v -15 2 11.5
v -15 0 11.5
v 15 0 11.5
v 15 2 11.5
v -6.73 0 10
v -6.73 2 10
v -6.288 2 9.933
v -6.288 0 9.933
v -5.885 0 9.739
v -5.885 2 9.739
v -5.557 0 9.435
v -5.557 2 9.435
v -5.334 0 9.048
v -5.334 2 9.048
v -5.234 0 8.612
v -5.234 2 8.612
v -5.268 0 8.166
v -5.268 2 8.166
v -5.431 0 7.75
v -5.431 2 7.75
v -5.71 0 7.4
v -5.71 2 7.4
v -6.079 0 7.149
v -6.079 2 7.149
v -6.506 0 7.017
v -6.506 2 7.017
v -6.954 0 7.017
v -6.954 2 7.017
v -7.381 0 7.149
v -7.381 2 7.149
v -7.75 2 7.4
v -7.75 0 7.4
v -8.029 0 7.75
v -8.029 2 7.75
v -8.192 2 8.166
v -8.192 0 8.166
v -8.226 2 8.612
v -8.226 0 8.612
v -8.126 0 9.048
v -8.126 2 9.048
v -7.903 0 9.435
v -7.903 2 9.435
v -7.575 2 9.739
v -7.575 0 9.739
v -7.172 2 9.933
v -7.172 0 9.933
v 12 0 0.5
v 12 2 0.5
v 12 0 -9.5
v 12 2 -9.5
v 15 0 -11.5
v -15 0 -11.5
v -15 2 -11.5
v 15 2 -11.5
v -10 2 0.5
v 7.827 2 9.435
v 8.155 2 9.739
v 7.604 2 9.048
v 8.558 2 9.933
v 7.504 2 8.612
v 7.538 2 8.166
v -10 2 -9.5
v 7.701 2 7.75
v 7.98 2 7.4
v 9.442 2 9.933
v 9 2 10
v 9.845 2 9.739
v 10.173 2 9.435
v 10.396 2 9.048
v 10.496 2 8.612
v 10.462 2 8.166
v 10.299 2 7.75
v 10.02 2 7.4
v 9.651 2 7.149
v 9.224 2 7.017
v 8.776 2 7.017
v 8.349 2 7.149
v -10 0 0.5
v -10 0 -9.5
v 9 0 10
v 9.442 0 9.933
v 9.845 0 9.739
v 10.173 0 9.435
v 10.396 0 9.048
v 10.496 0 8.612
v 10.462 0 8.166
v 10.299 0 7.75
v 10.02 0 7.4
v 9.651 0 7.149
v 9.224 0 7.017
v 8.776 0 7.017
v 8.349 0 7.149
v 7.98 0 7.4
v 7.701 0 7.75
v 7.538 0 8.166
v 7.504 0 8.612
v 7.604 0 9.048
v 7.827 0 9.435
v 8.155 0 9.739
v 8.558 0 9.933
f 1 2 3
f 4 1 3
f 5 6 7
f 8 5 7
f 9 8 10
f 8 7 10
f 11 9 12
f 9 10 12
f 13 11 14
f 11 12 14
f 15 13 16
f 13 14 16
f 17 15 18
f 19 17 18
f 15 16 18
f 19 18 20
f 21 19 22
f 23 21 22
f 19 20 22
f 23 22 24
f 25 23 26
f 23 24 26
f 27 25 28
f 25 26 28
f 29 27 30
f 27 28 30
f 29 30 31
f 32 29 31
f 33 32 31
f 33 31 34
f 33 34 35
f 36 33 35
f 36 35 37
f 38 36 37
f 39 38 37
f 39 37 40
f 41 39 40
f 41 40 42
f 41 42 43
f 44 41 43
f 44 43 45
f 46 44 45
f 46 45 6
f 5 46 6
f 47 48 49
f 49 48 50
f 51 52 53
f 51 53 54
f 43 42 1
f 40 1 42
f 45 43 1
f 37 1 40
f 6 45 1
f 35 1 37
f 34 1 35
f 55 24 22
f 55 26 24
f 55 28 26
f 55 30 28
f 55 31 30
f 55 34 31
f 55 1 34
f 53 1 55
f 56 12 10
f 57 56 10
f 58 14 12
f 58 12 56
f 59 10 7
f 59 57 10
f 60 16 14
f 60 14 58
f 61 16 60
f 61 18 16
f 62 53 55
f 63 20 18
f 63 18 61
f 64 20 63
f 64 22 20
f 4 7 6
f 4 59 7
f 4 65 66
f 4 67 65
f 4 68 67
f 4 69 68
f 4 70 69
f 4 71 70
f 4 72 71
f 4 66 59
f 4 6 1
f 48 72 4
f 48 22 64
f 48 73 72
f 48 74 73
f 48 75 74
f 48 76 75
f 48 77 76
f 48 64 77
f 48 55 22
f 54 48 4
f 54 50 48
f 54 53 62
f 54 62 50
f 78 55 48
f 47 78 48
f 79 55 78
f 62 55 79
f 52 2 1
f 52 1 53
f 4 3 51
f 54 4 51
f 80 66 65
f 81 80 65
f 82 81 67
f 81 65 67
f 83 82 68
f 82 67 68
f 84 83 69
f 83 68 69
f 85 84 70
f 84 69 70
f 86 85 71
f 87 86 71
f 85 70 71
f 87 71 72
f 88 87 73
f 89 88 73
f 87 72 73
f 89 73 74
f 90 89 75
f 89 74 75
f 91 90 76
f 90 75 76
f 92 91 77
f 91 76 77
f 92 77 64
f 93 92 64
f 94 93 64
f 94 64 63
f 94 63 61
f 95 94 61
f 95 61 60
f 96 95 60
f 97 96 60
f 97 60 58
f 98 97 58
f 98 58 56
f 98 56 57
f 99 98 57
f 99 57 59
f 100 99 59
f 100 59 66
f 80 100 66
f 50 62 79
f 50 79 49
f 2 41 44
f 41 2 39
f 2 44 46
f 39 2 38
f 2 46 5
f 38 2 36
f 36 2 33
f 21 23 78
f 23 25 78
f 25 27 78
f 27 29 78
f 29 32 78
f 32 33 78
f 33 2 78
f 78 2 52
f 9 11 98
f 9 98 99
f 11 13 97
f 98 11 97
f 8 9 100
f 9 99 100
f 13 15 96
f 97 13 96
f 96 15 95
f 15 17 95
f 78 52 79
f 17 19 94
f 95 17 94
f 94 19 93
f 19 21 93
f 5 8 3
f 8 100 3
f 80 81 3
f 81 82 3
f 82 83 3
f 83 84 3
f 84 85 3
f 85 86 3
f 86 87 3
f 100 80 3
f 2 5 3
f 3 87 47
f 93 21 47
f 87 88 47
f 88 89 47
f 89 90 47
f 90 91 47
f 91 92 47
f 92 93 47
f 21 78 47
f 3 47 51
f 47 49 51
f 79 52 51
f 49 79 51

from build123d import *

# Parameters (mm, degrees)
SKETCH1_W           = 30
SKETCH1_H           = 23
BOSS_EXTRUDE1_DEPTH = 2
SKETCH3_R           = 1.5
SKETCH3_W           = 22
SKETCH3_H           = 10
CUT_EXTRUDE2_DEPTH  = 3


with BuildPart() as part:
    # Sketch1 → Boss-Extrude1 (new body)
    with BuildSketch(Plane(origin=(0, 0, 0), x_dir=(1, 0, 0), z_dir=(0, 1, 0))):
        Rectangle(SKETCH1_W, SKETCH1_H)
    extrude(amount=BOSS_EXTRUDE1_DEPTH)

    # Sketch3 → Cut-Extrude2 (cut)
    with BuildSketch(Plane(origin=(0, 2, 0), x_dir=(1, 0, 0), z_dir=(0, 1, 0))):
        with Locations(Location((-6.73, -8.5, 0), (0, 0, 270))):
            Circle(SKETCH3_R)
        with Locations(Location((9, -8.5, 0), (0, 0, 270))):
            Circle(SKETCH3_R)
        with Locations((1, 4.5)):
            Rectangle(SKETCH3_W, SKETCH3_H)
    extrude(amount=-CUT_EXTRUDE2_DEPTH, mode=Mode.SUBTRACT)


solid = part.part
